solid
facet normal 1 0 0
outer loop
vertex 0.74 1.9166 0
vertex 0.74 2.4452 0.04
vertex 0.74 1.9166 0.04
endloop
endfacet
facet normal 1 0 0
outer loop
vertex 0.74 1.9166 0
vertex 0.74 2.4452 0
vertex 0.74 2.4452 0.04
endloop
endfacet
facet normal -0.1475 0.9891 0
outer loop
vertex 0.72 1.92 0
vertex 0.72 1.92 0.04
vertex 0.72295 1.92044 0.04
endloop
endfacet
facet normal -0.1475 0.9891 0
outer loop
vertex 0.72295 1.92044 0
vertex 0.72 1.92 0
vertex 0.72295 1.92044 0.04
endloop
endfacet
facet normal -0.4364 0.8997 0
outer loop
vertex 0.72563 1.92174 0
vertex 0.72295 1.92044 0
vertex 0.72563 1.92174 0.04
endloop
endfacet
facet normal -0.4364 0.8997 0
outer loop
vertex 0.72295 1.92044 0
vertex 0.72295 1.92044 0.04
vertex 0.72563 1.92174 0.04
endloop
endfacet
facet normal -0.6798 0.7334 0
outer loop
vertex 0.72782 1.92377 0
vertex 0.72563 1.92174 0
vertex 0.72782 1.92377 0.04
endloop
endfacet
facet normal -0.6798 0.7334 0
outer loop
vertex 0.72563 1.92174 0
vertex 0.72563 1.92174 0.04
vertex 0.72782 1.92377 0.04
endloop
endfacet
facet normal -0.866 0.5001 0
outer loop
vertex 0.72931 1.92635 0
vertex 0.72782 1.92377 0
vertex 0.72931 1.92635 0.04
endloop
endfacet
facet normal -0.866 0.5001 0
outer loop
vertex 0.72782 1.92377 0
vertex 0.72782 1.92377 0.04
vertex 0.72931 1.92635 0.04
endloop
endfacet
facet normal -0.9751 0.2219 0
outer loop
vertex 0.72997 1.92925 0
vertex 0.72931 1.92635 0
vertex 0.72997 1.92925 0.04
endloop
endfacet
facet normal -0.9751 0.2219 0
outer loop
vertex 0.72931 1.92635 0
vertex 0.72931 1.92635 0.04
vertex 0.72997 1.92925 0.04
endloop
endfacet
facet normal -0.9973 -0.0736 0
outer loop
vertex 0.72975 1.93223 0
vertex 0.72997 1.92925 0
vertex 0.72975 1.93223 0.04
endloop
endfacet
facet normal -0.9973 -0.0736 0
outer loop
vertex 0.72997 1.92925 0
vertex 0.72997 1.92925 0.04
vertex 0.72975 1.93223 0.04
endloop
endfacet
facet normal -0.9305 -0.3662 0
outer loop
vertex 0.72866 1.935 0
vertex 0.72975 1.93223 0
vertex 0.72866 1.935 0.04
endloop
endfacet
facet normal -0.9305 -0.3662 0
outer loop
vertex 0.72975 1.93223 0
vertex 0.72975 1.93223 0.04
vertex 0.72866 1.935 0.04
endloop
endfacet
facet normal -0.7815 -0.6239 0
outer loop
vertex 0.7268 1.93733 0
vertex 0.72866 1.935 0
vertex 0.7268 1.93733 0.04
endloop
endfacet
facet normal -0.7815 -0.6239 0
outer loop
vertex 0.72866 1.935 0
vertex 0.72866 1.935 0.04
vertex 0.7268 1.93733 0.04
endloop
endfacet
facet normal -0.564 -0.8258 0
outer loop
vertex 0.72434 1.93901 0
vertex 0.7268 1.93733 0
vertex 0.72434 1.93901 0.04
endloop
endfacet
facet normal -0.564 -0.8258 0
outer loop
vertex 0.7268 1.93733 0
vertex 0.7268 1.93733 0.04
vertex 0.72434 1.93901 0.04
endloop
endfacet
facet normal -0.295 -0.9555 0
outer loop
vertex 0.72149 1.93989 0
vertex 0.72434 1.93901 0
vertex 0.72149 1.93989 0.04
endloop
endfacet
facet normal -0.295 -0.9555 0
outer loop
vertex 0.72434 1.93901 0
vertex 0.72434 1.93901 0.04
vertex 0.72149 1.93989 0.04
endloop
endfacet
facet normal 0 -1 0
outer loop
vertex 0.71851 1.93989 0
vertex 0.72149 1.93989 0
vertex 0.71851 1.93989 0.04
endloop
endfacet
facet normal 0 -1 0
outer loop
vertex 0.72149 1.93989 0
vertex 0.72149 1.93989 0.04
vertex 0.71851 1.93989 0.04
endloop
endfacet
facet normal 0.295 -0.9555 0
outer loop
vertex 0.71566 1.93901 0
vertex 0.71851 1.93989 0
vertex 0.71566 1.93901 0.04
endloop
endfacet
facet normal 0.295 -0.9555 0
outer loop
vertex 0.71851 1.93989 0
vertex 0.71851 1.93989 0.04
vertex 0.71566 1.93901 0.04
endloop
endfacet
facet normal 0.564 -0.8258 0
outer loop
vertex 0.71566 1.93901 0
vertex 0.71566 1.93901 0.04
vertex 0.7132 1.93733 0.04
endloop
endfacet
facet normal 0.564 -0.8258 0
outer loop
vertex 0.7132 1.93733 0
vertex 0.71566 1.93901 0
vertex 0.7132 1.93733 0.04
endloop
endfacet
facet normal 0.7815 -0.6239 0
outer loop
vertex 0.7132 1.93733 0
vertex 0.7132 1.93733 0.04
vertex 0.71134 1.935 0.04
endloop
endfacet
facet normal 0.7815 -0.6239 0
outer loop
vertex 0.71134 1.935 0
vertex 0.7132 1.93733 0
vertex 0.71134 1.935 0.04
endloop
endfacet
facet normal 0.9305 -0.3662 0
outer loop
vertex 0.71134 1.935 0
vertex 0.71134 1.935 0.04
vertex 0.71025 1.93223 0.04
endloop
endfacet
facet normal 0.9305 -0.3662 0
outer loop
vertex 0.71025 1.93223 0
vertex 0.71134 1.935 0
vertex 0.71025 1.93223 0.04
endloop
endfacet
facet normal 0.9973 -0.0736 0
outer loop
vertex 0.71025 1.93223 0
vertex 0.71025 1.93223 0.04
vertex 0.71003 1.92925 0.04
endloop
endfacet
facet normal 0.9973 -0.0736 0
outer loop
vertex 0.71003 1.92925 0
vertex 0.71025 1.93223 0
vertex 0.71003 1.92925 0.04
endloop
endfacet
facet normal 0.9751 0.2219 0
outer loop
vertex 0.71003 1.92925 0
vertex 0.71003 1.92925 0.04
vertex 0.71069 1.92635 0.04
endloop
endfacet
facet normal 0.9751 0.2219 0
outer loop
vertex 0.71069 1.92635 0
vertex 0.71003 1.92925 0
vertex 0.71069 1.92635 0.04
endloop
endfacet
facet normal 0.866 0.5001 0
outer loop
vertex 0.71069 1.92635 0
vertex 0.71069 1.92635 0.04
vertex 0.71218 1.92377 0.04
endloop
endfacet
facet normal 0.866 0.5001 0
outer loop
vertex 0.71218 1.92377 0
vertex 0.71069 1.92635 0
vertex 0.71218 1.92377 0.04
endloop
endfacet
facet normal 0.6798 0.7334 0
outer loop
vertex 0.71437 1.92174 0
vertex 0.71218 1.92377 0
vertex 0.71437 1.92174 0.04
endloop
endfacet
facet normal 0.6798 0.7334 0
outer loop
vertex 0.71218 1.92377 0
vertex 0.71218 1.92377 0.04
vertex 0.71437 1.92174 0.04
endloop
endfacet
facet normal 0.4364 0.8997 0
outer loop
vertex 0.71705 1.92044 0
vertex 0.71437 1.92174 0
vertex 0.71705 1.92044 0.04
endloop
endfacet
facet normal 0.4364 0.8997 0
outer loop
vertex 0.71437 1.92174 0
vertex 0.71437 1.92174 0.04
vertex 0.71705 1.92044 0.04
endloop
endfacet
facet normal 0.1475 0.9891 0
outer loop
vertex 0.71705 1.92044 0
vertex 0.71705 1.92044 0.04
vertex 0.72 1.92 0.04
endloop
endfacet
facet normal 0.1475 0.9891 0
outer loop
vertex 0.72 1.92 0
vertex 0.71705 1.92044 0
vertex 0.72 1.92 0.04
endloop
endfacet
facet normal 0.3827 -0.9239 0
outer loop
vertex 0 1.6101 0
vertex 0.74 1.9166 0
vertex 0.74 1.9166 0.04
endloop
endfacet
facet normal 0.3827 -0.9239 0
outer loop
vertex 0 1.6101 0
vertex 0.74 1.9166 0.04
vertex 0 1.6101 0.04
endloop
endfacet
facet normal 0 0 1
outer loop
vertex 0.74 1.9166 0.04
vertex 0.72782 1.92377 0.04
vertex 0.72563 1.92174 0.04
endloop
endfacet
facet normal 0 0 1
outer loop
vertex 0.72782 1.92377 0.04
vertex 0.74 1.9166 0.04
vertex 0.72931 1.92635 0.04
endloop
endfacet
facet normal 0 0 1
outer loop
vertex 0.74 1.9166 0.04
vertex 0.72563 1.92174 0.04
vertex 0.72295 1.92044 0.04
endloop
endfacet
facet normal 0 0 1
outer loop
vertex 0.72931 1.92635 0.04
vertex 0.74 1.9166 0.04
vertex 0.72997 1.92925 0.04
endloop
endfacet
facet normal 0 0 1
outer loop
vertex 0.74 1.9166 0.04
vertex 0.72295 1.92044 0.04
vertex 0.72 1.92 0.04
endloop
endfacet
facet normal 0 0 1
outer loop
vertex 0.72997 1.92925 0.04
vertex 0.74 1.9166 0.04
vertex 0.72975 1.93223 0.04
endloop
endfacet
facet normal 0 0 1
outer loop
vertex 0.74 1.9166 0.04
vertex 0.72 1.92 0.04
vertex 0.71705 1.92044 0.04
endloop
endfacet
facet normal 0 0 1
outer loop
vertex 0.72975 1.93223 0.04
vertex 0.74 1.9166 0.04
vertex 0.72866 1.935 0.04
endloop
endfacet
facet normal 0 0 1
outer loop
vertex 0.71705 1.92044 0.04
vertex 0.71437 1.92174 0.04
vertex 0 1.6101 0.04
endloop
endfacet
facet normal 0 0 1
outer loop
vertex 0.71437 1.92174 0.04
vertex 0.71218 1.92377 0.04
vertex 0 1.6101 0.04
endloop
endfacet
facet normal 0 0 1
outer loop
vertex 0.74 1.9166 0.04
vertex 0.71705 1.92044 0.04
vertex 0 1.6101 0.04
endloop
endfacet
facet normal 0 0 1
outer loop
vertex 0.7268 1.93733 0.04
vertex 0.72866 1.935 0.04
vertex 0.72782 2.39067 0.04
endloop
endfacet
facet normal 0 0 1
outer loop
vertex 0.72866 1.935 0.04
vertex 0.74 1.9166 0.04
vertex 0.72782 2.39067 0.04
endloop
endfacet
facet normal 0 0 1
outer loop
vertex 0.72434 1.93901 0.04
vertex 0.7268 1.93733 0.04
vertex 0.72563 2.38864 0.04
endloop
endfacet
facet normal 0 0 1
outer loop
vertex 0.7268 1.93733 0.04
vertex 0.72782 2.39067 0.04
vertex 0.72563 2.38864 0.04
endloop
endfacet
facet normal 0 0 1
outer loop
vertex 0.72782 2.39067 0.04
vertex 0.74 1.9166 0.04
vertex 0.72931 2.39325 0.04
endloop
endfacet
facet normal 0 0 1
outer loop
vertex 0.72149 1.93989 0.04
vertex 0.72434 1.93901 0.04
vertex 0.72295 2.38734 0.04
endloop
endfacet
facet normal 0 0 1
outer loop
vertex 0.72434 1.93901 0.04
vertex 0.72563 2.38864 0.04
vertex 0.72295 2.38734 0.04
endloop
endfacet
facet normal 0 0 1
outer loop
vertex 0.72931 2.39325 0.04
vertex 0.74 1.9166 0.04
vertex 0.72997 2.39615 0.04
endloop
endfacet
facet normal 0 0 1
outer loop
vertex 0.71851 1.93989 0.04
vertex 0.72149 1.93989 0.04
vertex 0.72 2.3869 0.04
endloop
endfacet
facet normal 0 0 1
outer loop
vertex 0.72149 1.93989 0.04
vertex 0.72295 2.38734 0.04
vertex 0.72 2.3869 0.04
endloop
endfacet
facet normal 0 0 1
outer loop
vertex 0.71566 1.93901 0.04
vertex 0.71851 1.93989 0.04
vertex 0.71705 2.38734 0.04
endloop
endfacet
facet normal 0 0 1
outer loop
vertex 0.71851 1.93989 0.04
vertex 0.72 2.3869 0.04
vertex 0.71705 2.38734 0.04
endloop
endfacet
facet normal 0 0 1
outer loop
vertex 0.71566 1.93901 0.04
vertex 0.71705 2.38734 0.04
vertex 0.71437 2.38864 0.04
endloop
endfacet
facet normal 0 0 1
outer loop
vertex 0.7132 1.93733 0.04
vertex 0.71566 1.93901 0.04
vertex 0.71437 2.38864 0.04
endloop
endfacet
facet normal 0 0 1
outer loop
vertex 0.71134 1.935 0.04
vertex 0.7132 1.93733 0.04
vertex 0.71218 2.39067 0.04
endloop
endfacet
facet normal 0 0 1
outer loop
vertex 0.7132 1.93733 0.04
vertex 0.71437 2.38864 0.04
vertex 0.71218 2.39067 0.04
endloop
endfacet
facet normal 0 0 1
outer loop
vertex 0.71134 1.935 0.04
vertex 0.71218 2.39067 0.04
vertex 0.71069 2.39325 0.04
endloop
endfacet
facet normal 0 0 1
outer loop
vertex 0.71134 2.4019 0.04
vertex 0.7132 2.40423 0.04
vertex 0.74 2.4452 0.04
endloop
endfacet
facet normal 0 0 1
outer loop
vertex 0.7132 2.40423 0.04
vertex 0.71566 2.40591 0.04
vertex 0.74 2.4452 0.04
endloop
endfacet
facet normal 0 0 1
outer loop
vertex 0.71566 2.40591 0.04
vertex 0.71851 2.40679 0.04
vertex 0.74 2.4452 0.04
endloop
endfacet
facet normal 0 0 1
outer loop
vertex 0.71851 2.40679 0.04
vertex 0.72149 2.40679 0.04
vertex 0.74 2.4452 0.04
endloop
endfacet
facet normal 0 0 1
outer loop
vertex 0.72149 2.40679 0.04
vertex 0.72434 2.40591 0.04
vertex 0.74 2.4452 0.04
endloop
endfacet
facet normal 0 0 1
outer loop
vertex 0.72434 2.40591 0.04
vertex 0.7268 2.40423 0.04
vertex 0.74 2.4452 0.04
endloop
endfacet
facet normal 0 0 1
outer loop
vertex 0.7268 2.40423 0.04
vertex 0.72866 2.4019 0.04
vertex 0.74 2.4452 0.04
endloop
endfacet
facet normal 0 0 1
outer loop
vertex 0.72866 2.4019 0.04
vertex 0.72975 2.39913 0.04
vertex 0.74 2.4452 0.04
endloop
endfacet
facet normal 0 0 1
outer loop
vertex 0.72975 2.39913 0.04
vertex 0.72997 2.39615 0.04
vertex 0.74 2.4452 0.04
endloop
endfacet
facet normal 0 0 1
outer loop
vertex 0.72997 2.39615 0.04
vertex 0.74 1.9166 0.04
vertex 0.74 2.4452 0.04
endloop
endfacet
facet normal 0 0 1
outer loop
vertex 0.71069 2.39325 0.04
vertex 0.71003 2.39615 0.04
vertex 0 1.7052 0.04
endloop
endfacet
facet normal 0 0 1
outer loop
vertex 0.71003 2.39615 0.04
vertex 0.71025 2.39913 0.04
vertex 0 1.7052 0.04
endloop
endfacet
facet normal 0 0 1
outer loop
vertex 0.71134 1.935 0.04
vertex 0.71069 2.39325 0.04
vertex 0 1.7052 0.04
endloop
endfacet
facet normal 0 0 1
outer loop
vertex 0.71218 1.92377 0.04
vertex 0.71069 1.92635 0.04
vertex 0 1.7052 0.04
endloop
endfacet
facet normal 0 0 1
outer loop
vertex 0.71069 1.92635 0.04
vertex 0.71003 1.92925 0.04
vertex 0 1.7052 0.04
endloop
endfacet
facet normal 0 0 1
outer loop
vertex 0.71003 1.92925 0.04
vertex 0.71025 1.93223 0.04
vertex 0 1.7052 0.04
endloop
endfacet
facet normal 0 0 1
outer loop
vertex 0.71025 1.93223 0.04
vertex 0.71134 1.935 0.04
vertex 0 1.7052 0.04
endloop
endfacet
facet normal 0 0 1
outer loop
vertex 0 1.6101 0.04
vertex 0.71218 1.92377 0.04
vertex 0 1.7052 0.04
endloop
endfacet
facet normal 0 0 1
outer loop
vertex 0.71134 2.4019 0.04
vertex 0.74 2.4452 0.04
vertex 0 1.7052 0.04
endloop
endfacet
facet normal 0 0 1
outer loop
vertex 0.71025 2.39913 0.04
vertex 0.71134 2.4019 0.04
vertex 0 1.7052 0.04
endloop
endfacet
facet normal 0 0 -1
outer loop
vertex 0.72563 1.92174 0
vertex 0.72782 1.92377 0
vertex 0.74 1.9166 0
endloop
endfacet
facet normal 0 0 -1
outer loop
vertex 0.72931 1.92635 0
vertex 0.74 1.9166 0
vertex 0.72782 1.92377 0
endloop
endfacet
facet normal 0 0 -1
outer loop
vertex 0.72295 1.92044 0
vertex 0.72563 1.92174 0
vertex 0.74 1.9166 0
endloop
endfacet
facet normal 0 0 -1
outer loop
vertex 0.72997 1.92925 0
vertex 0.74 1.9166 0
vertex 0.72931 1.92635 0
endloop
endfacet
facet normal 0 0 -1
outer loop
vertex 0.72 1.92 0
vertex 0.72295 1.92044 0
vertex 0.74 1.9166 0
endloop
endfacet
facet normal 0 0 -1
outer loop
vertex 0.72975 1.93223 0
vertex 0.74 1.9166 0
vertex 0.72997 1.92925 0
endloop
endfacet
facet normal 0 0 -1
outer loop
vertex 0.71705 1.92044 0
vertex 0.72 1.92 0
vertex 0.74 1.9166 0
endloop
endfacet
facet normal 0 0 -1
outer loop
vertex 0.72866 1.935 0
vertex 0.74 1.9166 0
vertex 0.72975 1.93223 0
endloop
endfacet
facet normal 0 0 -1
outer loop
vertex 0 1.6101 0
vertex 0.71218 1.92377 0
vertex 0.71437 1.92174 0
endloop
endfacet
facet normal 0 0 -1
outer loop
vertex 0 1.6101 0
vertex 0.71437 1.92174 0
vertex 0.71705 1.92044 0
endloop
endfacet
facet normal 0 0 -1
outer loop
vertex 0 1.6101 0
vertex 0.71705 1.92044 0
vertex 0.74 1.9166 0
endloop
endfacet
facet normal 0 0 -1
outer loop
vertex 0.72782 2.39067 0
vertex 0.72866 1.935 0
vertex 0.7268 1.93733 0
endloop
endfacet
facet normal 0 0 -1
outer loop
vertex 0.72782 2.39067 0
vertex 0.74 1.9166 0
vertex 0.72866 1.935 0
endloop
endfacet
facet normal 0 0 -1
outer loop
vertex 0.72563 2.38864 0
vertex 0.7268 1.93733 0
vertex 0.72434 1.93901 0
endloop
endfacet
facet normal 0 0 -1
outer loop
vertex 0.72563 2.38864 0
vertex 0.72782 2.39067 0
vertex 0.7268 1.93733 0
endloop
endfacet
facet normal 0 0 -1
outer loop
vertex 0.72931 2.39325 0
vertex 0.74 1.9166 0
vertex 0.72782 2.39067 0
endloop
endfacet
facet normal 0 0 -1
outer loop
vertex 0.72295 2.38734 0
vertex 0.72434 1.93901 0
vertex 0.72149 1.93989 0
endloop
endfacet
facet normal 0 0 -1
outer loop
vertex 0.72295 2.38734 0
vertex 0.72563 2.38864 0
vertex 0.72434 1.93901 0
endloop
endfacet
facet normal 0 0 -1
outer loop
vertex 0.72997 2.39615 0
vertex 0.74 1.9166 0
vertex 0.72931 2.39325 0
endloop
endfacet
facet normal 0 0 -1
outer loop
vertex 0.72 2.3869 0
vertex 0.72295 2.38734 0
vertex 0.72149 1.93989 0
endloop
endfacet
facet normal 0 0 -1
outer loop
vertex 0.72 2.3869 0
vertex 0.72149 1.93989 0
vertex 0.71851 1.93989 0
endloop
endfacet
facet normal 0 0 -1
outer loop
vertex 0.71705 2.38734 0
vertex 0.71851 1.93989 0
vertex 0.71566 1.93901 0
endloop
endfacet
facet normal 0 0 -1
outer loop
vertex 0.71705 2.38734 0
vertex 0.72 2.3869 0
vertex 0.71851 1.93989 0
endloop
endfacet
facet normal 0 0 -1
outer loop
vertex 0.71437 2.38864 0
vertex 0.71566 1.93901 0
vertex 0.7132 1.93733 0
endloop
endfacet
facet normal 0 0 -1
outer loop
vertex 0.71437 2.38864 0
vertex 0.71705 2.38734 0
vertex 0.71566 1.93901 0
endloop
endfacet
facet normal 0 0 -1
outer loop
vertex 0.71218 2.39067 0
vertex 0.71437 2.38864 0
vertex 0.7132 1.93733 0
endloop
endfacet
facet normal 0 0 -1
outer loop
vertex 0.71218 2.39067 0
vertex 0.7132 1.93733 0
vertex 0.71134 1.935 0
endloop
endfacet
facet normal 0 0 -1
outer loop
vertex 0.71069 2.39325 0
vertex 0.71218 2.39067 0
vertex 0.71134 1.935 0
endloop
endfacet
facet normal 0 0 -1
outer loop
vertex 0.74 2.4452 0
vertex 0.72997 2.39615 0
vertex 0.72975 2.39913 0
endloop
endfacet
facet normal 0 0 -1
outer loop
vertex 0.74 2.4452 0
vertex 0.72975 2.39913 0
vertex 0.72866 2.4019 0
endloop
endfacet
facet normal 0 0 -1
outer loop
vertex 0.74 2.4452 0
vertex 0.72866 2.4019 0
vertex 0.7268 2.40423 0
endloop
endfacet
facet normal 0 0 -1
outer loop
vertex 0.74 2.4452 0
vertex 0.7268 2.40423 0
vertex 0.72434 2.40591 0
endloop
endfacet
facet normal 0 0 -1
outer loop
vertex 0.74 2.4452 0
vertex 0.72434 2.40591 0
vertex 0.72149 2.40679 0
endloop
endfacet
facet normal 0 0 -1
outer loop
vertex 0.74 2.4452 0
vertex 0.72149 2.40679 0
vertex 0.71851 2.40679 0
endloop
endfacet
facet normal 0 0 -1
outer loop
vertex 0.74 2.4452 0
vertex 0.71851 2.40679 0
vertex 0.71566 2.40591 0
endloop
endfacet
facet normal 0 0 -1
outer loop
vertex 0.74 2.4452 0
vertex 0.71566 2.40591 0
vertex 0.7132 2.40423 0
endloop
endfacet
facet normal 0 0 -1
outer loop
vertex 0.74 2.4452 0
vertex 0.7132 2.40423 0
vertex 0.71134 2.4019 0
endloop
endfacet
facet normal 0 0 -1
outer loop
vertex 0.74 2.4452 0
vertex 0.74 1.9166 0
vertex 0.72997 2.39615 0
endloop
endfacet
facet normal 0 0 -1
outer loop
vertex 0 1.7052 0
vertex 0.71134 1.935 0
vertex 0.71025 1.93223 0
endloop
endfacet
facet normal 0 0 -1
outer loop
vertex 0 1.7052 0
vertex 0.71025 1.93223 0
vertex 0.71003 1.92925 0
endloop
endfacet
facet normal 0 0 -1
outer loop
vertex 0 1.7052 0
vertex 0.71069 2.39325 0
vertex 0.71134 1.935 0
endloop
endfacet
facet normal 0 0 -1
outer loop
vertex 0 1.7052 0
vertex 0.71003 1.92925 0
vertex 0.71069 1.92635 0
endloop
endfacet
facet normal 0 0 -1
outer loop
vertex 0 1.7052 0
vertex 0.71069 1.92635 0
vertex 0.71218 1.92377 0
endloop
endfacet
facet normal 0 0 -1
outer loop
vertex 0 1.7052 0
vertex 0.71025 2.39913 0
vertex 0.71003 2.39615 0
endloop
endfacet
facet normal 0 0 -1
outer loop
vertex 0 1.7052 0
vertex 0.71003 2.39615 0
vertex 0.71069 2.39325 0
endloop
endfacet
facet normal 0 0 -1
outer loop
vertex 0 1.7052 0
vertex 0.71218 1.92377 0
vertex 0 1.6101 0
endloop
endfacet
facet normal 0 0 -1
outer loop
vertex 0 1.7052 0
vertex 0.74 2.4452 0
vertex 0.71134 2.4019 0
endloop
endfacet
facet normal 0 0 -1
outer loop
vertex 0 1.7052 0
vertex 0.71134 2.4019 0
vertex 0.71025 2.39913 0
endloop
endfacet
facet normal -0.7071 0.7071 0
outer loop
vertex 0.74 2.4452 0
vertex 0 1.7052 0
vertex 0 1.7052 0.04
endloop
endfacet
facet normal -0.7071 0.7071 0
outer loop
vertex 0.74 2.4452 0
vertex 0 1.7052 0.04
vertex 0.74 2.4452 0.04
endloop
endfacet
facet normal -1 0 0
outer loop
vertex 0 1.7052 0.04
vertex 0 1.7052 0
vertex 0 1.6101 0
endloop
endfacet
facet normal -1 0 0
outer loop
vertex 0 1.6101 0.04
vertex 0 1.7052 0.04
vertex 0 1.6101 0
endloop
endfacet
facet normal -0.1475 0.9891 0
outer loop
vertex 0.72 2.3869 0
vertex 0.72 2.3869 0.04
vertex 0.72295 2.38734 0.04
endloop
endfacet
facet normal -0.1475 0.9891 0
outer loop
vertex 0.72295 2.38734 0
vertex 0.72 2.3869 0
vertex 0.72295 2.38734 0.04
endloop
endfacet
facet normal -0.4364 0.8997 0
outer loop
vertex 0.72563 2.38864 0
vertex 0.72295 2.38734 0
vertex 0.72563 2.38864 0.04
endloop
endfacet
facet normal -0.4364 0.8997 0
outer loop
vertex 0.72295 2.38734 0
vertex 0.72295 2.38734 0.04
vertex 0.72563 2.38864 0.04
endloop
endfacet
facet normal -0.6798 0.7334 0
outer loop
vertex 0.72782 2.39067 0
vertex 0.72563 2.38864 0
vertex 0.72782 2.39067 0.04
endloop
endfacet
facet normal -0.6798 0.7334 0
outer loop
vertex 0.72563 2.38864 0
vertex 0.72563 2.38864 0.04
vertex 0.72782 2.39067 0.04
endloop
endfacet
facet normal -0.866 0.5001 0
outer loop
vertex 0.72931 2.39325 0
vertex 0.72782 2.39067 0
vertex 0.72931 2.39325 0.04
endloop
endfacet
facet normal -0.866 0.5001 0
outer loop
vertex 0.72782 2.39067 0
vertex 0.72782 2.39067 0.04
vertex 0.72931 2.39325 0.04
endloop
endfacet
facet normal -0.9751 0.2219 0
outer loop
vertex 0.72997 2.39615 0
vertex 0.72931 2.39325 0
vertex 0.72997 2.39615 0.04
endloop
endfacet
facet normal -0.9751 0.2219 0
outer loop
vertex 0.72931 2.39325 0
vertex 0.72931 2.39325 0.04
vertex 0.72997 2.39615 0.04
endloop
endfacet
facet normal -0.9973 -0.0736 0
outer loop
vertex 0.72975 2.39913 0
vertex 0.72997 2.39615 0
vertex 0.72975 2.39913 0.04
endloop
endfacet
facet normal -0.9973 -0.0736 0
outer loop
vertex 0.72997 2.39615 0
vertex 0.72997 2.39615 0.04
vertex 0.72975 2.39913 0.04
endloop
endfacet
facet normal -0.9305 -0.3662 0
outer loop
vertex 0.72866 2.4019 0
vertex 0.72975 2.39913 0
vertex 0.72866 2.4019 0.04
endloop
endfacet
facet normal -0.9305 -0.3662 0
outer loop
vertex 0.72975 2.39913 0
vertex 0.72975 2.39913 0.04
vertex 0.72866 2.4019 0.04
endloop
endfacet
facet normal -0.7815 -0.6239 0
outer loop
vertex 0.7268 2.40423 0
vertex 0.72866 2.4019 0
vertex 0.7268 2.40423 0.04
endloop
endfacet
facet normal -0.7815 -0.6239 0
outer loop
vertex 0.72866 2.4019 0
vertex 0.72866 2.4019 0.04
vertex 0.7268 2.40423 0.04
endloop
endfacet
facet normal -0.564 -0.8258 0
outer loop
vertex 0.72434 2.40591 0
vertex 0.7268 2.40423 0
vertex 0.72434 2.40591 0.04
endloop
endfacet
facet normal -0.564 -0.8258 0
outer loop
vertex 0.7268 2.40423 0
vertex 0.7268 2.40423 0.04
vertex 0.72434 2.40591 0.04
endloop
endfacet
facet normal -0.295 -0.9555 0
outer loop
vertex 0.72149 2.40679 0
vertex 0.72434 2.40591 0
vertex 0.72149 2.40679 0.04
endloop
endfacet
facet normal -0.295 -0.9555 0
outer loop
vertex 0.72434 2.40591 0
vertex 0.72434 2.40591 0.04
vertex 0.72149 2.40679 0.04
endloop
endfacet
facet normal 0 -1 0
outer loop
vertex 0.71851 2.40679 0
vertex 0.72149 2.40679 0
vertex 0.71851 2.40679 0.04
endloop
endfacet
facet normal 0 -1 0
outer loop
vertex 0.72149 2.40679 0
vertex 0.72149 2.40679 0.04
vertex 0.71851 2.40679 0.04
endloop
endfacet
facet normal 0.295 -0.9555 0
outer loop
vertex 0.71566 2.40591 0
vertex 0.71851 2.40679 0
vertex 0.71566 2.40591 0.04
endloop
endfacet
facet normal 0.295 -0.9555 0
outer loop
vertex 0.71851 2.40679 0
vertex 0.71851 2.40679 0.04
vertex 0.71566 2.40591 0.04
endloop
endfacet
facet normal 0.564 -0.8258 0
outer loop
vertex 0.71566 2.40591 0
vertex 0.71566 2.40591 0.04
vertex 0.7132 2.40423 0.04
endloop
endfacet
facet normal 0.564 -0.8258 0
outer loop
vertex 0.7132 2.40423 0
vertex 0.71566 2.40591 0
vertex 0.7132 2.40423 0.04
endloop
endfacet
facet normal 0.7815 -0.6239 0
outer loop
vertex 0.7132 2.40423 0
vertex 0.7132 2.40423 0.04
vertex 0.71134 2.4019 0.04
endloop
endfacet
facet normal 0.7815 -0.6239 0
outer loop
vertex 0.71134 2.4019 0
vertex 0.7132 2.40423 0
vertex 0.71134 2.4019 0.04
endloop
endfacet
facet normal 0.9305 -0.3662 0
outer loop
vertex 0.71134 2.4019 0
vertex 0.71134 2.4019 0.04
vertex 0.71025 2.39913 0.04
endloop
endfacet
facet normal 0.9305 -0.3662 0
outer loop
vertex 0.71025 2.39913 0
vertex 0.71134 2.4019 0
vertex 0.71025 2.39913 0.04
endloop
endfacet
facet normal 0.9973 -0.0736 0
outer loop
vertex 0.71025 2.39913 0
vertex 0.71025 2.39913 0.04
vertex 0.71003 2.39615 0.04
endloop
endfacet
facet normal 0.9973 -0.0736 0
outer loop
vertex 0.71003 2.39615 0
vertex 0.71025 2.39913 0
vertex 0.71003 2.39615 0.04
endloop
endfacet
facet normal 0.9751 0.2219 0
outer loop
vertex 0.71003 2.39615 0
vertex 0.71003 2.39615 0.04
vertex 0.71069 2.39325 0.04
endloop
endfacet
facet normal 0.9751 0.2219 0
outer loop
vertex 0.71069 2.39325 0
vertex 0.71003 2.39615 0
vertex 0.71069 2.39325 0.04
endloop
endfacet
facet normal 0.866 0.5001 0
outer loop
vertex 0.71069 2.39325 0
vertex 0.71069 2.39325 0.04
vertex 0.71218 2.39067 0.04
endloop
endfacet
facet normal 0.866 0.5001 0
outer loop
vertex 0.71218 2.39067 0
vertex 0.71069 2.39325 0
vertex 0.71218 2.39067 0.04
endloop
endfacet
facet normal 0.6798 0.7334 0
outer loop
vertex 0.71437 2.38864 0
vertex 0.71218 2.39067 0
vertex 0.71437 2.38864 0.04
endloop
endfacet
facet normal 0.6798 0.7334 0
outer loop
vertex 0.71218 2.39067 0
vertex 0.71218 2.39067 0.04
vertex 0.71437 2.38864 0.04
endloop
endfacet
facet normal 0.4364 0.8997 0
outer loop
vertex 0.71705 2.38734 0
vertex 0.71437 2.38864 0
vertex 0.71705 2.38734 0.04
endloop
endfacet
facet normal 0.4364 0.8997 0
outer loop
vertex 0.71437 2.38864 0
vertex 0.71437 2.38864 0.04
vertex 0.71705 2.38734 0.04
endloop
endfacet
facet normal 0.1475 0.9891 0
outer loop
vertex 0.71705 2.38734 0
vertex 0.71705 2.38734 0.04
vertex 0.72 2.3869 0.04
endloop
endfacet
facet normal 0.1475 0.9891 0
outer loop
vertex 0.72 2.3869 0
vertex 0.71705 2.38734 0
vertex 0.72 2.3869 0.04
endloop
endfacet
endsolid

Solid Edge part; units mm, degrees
sketch "Sketch1" plane through (0, 0, 0) normal (0, 0, 1) x (1, 0, 0)
  line L0 (0.74, 1.9166) -> (0, 1.6101)
  line L1 (0, 1.7052) -> (0, 1.6101)
  line L2 (0, 1.7052) -> (0.74, 2.4452)
  line L3 (0.74, 2.4452) -> (0.74, 1.9166)
extrude "Protrusion1" add sketch "Sketch1" along normal blind 0.04
hole "Bohrung_3" at (0.72, 1.93, 0.04) direction (0, 0, -1) diameter 0.02 end through all
hole "Hole1" at (0.72, 2.3969, 0.04) direction (0, 0, -1) diameter 0.02 end through all
